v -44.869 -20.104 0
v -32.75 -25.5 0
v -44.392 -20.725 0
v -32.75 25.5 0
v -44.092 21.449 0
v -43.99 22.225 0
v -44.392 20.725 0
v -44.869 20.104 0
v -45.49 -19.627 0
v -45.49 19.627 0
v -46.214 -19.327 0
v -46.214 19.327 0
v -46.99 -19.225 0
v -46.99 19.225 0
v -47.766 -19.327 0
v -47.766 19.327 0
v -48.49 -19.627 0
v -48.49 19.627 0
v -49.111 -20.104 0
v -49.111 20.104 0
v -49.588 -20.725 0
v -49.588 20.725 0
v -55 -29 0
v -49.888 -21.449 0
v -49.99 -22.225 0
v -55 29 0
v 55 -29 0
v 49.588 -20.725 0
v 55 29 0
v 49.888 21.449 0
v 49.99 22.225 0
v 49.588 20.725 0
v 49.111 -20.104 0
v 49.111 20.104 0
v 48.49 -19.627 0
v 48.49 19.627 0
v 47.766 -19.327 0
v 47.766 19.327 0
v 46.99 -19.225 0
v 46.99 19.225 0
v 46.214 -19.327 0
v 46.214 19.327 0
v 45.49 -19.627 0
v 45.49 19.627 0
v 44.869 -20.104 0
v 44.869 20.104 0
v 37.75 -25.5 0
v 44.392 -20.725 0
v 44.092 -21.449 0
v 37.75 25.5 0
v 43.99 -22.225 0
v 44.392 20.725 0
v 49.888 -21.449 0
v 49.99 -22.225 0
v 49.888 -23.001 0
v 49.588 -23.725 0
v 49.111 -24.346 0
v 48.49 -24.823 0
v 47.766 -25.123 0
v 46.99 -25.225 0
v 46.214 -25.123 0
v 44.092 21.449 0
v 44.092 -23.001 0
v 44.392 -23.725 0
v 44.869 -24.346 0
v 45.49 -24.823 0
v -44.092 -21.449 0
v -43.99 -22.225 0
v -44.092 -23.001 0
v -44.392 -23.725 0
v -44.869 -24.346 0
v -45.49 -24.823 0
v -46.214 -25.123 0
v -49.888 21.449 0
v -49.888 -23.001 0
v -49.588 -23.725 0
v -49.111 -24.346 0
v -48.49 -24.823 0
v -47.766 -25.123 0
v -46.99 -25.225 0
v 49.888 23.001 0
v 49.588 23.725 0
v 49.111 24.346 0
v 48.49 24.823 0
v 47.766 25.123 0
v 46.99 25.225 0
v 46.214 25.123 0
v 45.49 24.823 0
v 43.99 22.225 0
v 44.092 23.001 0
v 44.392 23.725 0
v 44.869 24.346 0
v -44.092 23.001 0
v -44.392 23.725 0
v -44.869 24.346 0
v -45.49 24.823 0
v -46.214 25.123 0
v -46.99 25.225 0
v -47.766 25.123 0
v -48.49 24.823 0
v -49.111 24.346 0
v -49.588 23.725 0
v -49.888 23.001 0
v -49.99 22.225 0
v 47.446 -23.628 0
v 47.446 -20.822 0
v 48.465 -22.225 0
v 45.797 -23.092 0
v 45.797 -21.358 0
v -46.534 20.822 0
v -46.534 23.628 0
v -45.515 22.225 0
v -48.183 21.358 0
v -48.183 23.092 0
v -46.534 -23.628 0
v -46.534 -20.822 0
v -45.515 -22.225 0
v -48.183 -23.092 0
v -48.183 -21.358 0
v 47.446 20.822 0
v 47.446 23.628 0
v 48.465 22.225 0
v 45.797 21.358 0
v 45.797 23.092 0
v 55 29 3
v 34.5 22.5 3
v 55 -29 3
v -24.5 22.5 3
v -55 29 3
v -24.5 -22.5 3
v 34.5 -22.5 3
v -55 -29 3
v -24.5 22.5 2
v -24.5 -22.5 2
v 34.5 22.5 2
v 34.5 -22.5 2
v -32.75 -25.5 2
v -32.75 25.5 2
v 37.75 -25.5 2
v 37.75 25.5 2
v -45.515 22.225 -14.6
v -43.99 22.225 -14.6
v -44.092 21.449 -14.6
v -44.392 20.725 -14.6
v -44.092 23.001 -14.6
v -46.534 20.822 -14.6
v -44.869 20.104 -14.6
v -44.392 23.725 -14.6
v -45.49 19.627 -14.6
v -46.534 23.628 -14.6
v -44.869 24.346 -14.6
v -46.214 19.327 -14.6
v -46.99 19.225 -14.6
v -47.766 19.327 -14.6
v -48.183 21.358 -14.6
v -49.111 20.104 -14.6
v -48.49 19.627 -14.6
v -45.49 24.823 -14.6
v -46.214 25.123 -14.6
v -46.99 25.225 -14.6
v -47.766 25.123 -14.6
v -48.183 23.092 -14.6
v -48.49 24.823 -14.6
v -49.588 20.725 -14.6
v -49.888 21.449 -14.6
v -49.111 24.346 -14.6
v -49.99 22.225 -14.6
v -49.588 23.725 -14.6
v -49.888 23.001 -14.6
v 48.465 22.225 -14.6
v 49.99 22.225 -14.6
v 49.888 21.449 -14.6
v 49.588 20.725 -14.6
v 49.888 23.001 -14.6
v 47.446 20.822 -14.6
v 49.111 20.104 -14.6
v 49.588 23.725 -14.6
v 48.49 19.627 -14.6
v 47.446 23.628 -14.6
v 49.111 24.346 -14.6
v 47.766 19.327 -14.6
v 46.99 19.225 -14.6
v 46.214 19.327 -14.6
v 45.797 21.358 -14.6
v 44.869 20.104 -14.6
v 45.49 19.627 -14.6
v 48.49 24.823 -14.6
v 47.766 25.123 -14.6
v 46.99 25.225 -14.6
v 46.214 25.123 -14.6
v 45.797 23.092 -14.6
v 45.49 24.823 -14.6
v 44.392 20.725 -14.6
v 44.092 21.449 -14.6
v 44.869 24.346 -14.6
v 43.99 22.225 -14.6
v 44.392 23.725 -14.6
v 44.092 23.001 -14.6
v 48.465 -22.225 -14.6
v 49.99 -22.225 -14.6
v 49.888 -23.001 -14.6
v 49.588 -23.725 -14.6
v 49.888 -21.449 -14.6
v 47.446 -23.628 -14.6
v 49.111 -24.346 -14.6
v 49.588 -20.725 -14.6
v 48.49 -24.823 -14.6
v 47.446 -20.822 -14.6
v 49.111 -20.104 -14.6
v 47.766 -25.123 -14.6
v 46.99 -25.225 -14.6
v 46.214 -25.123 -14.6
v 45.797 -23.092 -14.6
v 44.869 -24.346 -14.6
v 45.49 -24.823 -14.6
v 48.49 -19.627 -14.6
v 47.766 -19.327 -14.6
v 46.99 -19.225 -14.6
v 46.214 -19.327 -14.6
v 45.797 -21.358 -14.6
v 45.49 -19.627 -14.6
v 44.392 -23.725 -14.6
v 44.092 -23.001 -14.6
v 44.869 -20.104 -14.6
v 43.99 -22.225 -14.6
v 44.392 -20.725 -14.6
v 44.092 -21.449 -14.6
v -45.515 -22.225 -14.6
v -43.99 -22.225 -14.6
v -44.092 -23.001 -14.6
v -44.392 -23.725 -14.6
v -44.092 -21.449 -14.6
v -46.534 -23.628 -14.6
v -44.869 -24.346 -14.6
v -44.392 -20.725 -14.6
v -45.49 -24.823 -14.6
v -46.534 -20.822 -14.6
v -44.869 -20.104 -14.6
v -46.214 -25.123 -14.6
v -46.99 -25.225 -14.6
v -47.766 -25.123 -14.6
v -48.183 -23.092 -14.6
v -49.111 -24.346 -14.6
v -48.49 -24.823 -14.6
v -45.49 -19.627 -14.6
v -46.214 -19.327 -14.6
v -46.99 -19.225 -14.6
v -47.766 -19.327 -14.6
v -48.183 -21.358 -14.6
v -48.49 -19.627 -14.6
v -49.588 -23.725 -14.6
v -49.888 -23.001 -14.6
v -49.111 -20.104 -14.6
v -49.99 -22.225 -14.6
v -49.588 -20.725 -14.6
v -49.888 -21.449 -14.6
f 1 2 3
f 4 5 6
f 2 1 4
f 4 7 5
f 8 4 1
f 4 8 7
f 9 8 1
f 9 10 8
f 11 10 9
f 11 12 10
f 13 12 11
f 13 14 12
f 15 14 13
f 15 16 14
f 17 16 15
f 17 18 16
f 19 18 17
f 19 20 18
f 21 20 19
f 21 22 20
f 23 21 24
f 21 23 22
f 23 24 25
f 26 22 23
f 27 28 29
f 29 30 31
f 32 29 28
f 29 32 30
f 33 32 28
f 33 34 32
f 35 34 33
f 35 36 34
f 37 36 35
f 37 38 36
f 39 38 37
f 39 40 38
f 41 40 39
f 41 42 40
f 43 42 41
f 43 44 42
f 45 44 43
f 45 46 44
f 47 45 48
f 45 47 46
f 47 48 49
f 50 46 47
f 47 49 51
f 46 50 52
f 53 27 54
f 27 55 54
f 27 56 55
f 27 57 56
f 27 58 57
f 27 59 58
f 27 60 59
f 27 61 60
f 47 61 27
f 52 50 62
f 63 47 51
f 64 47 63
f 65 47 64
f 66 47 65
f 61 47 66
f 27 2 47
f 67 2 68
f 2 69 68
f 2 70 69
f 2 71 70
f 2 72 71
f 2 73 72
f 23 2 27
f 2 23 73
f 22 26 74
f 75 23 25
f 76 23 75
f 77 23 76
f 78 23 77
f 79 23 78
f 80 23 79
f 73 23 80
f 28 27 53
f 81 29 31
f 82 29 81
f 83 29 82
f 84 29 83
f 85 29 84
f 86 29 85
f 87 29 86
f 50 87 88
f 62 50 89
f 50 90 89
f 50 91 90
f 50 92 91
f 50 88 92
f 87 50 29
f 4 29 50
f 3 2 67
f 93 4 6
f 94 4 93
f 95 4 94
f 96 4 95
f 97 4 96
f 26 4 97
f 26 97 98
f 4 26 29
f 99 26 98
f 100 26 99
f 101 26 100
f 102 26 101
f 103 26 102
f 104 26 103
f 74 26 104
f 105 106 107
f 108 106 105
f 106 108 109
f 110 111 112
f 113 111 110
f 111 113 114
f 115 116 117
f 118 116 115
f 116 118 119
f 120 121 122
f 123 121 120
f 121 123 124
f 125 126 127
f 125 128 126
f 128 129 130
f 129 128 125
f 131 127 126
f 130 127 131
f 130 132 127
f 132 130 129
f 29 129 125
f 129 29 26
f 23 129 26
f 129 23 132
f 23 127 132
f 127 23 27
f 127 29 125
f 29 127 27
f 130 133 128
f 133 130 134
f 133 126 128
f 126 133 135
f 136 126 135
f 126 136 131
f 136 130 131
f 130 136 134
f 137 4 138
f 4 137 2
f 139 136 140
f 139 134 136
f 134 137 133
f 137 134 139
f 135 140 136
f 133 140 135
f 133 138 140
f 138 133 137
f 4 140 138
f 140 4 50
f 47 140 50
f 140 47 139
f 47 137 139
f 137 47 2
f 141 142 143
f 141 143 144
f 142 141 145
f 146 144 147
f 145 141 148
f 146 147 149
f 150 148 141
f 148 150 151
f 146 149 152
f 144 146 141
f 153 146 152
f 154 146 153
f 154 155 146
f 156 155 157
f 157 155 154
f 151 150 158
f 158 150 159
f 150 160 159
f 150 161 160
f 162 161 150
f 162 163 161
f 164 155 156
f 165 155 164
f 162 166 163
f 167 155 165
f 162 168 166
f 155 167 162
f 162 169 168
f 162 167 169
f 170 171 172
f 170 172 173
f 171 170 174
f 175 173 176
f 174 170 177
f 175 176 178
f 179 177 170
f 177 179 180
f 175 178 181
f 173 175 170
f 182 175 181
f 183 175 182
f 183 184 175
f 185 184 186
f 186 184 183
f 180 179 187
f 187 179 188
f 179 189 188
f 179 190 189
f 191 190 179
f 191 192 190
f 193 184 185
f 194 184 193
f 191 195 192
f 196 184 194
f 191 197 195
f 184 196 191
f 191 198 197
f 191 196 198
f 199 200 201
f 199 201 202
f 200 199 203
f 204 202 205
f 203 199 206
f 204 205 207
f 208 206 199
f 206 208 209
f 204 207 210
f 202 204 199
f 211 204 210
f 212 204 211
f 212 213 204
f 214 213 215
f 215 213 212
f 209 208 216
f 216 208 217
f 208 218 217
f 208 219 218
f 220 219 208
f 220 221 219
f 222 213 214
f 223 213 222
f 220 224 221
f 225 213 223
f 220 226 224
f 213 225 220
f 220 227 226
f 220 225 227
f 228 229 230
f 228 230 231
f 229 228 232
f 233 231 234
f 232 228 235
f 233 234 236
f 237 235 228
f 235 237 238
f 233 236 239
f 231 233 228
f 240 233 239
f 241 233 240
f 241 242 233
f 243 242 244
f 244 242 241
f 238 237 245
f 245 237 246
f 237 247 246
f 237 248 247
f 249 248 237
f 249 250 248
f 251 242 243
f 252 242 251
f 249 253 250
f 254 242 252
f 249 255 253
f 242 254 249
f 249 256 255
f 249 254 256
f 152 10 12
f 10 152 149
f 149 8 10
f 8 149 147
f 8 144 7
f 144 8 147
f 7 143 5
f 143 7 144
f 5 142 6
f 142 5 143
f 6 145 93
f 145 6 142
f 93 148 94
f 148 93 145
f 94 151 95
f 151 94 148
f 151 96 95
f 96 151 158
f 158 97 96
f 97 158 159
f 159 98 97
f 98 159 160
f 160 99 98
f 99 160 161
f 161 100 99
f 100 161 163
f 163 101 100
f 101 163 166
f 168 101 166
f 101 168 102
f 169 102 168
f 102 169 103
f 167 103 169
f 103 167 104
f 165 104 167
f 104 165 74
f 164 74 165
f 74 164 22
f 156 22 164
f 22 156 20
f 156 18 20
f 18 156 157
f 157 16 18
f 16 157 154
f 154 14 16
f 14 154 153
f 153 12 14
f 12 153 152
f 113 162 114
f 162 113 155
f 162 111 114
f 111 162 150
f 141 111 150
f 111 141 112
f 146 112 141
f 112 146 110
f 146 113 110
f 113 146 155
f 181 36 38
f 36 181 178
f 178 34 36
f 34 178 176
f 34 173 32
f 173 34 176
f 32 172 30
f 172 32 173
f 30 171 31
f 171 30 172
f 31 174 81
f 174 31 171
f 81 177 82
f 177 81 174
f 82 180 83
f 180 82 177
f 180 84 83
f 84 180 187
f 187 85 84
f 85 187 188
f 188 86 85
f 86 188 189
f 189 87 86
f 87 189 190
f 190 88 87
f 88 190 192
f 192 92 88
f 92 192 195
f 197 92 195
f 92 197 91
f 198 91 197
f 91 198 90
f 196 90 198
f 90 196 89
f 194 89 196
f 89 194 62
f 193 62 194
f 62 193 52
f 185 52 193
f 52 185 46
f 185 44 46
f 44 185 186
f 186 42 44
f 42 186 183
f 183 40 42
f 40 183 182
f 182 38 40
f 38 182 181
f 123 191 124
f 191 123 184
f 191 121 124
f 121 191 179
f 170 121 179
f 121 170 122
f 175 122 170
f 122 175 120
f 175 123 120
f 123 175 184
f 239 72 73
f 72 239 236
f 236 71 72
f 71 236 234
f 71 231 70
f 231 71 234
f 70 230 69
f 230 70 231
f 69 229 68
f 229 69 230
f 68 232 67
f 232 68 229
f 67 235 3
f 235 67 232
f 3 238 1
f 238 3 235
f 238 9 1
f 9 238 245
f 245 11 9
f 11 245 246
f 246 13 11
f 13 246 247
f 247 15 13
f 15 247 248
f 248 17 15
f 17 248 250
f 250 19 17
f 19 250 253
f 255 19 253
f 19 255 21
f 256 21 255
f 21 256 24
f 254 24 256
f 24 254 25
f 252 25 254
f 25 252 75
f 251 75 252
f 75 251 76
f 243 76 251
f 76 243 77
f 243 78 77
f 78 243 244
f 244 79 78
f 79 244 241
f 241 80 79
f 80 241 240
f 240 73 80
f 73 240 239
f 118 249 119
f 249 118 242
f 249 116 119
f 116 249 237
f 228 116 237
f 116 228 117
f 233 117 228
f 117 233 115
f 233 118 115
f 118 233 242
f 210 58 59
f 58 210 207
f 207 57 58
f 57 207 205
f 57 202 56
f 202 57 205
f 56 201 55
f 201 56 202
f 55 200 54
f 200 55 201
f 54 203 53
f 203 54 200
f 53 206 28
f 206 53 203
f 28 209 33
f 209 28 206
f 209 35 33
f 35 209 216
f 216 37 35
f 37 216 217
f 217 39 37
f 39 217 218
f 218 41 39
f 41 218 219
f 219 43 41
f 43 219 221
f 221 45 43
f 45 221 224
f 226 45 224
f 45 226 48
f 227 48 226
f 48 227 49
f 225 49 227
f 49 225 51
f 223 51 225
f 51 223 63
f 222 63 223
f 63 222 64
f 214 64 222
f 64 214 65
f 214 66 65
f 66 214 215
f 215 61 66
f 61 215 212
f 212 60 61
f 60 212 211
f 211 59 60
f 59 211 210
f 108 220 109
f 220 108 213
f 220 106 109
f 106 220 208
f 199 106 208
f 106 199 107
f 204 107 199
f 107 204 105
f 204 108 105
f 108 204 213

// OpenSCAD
module TopSection(thickness, display_offset) {
  difference() {
    linear_extrude(thickness) {
      difference() {
        // Main body
        square([110, 58], center = true);

        // Display area cutout
        translate([5, 0] + display_offset) {
          square([59, 45], center = true);
        }
      }
    }

    linear_extrude(2) {
      translate([2.5, 0] + display_offset) {
        square([70.5, 51], center = true);
      }
    }
  }

  translate([0, 0, -14.6]) {
    linear_extrude(14.6) {
      PlaceMountingHoles() {
        difference() {
          circle(d = 6, $fn = 24);
          circle(d = 2.95, $fn = 5);
        }
      }
    }
  }
}


module PlaceMountingHoles() {
  dx = 93.98 / 2;
  dy = 44.45 / 2;

  for(x = [-dx, dx]) {
    for(y = [-dy, dy]) {
      translate([x, y]) {
        children();
      }
    }
  }
}

TopSection(thickness = 3, display_offset = [0, 0]);
